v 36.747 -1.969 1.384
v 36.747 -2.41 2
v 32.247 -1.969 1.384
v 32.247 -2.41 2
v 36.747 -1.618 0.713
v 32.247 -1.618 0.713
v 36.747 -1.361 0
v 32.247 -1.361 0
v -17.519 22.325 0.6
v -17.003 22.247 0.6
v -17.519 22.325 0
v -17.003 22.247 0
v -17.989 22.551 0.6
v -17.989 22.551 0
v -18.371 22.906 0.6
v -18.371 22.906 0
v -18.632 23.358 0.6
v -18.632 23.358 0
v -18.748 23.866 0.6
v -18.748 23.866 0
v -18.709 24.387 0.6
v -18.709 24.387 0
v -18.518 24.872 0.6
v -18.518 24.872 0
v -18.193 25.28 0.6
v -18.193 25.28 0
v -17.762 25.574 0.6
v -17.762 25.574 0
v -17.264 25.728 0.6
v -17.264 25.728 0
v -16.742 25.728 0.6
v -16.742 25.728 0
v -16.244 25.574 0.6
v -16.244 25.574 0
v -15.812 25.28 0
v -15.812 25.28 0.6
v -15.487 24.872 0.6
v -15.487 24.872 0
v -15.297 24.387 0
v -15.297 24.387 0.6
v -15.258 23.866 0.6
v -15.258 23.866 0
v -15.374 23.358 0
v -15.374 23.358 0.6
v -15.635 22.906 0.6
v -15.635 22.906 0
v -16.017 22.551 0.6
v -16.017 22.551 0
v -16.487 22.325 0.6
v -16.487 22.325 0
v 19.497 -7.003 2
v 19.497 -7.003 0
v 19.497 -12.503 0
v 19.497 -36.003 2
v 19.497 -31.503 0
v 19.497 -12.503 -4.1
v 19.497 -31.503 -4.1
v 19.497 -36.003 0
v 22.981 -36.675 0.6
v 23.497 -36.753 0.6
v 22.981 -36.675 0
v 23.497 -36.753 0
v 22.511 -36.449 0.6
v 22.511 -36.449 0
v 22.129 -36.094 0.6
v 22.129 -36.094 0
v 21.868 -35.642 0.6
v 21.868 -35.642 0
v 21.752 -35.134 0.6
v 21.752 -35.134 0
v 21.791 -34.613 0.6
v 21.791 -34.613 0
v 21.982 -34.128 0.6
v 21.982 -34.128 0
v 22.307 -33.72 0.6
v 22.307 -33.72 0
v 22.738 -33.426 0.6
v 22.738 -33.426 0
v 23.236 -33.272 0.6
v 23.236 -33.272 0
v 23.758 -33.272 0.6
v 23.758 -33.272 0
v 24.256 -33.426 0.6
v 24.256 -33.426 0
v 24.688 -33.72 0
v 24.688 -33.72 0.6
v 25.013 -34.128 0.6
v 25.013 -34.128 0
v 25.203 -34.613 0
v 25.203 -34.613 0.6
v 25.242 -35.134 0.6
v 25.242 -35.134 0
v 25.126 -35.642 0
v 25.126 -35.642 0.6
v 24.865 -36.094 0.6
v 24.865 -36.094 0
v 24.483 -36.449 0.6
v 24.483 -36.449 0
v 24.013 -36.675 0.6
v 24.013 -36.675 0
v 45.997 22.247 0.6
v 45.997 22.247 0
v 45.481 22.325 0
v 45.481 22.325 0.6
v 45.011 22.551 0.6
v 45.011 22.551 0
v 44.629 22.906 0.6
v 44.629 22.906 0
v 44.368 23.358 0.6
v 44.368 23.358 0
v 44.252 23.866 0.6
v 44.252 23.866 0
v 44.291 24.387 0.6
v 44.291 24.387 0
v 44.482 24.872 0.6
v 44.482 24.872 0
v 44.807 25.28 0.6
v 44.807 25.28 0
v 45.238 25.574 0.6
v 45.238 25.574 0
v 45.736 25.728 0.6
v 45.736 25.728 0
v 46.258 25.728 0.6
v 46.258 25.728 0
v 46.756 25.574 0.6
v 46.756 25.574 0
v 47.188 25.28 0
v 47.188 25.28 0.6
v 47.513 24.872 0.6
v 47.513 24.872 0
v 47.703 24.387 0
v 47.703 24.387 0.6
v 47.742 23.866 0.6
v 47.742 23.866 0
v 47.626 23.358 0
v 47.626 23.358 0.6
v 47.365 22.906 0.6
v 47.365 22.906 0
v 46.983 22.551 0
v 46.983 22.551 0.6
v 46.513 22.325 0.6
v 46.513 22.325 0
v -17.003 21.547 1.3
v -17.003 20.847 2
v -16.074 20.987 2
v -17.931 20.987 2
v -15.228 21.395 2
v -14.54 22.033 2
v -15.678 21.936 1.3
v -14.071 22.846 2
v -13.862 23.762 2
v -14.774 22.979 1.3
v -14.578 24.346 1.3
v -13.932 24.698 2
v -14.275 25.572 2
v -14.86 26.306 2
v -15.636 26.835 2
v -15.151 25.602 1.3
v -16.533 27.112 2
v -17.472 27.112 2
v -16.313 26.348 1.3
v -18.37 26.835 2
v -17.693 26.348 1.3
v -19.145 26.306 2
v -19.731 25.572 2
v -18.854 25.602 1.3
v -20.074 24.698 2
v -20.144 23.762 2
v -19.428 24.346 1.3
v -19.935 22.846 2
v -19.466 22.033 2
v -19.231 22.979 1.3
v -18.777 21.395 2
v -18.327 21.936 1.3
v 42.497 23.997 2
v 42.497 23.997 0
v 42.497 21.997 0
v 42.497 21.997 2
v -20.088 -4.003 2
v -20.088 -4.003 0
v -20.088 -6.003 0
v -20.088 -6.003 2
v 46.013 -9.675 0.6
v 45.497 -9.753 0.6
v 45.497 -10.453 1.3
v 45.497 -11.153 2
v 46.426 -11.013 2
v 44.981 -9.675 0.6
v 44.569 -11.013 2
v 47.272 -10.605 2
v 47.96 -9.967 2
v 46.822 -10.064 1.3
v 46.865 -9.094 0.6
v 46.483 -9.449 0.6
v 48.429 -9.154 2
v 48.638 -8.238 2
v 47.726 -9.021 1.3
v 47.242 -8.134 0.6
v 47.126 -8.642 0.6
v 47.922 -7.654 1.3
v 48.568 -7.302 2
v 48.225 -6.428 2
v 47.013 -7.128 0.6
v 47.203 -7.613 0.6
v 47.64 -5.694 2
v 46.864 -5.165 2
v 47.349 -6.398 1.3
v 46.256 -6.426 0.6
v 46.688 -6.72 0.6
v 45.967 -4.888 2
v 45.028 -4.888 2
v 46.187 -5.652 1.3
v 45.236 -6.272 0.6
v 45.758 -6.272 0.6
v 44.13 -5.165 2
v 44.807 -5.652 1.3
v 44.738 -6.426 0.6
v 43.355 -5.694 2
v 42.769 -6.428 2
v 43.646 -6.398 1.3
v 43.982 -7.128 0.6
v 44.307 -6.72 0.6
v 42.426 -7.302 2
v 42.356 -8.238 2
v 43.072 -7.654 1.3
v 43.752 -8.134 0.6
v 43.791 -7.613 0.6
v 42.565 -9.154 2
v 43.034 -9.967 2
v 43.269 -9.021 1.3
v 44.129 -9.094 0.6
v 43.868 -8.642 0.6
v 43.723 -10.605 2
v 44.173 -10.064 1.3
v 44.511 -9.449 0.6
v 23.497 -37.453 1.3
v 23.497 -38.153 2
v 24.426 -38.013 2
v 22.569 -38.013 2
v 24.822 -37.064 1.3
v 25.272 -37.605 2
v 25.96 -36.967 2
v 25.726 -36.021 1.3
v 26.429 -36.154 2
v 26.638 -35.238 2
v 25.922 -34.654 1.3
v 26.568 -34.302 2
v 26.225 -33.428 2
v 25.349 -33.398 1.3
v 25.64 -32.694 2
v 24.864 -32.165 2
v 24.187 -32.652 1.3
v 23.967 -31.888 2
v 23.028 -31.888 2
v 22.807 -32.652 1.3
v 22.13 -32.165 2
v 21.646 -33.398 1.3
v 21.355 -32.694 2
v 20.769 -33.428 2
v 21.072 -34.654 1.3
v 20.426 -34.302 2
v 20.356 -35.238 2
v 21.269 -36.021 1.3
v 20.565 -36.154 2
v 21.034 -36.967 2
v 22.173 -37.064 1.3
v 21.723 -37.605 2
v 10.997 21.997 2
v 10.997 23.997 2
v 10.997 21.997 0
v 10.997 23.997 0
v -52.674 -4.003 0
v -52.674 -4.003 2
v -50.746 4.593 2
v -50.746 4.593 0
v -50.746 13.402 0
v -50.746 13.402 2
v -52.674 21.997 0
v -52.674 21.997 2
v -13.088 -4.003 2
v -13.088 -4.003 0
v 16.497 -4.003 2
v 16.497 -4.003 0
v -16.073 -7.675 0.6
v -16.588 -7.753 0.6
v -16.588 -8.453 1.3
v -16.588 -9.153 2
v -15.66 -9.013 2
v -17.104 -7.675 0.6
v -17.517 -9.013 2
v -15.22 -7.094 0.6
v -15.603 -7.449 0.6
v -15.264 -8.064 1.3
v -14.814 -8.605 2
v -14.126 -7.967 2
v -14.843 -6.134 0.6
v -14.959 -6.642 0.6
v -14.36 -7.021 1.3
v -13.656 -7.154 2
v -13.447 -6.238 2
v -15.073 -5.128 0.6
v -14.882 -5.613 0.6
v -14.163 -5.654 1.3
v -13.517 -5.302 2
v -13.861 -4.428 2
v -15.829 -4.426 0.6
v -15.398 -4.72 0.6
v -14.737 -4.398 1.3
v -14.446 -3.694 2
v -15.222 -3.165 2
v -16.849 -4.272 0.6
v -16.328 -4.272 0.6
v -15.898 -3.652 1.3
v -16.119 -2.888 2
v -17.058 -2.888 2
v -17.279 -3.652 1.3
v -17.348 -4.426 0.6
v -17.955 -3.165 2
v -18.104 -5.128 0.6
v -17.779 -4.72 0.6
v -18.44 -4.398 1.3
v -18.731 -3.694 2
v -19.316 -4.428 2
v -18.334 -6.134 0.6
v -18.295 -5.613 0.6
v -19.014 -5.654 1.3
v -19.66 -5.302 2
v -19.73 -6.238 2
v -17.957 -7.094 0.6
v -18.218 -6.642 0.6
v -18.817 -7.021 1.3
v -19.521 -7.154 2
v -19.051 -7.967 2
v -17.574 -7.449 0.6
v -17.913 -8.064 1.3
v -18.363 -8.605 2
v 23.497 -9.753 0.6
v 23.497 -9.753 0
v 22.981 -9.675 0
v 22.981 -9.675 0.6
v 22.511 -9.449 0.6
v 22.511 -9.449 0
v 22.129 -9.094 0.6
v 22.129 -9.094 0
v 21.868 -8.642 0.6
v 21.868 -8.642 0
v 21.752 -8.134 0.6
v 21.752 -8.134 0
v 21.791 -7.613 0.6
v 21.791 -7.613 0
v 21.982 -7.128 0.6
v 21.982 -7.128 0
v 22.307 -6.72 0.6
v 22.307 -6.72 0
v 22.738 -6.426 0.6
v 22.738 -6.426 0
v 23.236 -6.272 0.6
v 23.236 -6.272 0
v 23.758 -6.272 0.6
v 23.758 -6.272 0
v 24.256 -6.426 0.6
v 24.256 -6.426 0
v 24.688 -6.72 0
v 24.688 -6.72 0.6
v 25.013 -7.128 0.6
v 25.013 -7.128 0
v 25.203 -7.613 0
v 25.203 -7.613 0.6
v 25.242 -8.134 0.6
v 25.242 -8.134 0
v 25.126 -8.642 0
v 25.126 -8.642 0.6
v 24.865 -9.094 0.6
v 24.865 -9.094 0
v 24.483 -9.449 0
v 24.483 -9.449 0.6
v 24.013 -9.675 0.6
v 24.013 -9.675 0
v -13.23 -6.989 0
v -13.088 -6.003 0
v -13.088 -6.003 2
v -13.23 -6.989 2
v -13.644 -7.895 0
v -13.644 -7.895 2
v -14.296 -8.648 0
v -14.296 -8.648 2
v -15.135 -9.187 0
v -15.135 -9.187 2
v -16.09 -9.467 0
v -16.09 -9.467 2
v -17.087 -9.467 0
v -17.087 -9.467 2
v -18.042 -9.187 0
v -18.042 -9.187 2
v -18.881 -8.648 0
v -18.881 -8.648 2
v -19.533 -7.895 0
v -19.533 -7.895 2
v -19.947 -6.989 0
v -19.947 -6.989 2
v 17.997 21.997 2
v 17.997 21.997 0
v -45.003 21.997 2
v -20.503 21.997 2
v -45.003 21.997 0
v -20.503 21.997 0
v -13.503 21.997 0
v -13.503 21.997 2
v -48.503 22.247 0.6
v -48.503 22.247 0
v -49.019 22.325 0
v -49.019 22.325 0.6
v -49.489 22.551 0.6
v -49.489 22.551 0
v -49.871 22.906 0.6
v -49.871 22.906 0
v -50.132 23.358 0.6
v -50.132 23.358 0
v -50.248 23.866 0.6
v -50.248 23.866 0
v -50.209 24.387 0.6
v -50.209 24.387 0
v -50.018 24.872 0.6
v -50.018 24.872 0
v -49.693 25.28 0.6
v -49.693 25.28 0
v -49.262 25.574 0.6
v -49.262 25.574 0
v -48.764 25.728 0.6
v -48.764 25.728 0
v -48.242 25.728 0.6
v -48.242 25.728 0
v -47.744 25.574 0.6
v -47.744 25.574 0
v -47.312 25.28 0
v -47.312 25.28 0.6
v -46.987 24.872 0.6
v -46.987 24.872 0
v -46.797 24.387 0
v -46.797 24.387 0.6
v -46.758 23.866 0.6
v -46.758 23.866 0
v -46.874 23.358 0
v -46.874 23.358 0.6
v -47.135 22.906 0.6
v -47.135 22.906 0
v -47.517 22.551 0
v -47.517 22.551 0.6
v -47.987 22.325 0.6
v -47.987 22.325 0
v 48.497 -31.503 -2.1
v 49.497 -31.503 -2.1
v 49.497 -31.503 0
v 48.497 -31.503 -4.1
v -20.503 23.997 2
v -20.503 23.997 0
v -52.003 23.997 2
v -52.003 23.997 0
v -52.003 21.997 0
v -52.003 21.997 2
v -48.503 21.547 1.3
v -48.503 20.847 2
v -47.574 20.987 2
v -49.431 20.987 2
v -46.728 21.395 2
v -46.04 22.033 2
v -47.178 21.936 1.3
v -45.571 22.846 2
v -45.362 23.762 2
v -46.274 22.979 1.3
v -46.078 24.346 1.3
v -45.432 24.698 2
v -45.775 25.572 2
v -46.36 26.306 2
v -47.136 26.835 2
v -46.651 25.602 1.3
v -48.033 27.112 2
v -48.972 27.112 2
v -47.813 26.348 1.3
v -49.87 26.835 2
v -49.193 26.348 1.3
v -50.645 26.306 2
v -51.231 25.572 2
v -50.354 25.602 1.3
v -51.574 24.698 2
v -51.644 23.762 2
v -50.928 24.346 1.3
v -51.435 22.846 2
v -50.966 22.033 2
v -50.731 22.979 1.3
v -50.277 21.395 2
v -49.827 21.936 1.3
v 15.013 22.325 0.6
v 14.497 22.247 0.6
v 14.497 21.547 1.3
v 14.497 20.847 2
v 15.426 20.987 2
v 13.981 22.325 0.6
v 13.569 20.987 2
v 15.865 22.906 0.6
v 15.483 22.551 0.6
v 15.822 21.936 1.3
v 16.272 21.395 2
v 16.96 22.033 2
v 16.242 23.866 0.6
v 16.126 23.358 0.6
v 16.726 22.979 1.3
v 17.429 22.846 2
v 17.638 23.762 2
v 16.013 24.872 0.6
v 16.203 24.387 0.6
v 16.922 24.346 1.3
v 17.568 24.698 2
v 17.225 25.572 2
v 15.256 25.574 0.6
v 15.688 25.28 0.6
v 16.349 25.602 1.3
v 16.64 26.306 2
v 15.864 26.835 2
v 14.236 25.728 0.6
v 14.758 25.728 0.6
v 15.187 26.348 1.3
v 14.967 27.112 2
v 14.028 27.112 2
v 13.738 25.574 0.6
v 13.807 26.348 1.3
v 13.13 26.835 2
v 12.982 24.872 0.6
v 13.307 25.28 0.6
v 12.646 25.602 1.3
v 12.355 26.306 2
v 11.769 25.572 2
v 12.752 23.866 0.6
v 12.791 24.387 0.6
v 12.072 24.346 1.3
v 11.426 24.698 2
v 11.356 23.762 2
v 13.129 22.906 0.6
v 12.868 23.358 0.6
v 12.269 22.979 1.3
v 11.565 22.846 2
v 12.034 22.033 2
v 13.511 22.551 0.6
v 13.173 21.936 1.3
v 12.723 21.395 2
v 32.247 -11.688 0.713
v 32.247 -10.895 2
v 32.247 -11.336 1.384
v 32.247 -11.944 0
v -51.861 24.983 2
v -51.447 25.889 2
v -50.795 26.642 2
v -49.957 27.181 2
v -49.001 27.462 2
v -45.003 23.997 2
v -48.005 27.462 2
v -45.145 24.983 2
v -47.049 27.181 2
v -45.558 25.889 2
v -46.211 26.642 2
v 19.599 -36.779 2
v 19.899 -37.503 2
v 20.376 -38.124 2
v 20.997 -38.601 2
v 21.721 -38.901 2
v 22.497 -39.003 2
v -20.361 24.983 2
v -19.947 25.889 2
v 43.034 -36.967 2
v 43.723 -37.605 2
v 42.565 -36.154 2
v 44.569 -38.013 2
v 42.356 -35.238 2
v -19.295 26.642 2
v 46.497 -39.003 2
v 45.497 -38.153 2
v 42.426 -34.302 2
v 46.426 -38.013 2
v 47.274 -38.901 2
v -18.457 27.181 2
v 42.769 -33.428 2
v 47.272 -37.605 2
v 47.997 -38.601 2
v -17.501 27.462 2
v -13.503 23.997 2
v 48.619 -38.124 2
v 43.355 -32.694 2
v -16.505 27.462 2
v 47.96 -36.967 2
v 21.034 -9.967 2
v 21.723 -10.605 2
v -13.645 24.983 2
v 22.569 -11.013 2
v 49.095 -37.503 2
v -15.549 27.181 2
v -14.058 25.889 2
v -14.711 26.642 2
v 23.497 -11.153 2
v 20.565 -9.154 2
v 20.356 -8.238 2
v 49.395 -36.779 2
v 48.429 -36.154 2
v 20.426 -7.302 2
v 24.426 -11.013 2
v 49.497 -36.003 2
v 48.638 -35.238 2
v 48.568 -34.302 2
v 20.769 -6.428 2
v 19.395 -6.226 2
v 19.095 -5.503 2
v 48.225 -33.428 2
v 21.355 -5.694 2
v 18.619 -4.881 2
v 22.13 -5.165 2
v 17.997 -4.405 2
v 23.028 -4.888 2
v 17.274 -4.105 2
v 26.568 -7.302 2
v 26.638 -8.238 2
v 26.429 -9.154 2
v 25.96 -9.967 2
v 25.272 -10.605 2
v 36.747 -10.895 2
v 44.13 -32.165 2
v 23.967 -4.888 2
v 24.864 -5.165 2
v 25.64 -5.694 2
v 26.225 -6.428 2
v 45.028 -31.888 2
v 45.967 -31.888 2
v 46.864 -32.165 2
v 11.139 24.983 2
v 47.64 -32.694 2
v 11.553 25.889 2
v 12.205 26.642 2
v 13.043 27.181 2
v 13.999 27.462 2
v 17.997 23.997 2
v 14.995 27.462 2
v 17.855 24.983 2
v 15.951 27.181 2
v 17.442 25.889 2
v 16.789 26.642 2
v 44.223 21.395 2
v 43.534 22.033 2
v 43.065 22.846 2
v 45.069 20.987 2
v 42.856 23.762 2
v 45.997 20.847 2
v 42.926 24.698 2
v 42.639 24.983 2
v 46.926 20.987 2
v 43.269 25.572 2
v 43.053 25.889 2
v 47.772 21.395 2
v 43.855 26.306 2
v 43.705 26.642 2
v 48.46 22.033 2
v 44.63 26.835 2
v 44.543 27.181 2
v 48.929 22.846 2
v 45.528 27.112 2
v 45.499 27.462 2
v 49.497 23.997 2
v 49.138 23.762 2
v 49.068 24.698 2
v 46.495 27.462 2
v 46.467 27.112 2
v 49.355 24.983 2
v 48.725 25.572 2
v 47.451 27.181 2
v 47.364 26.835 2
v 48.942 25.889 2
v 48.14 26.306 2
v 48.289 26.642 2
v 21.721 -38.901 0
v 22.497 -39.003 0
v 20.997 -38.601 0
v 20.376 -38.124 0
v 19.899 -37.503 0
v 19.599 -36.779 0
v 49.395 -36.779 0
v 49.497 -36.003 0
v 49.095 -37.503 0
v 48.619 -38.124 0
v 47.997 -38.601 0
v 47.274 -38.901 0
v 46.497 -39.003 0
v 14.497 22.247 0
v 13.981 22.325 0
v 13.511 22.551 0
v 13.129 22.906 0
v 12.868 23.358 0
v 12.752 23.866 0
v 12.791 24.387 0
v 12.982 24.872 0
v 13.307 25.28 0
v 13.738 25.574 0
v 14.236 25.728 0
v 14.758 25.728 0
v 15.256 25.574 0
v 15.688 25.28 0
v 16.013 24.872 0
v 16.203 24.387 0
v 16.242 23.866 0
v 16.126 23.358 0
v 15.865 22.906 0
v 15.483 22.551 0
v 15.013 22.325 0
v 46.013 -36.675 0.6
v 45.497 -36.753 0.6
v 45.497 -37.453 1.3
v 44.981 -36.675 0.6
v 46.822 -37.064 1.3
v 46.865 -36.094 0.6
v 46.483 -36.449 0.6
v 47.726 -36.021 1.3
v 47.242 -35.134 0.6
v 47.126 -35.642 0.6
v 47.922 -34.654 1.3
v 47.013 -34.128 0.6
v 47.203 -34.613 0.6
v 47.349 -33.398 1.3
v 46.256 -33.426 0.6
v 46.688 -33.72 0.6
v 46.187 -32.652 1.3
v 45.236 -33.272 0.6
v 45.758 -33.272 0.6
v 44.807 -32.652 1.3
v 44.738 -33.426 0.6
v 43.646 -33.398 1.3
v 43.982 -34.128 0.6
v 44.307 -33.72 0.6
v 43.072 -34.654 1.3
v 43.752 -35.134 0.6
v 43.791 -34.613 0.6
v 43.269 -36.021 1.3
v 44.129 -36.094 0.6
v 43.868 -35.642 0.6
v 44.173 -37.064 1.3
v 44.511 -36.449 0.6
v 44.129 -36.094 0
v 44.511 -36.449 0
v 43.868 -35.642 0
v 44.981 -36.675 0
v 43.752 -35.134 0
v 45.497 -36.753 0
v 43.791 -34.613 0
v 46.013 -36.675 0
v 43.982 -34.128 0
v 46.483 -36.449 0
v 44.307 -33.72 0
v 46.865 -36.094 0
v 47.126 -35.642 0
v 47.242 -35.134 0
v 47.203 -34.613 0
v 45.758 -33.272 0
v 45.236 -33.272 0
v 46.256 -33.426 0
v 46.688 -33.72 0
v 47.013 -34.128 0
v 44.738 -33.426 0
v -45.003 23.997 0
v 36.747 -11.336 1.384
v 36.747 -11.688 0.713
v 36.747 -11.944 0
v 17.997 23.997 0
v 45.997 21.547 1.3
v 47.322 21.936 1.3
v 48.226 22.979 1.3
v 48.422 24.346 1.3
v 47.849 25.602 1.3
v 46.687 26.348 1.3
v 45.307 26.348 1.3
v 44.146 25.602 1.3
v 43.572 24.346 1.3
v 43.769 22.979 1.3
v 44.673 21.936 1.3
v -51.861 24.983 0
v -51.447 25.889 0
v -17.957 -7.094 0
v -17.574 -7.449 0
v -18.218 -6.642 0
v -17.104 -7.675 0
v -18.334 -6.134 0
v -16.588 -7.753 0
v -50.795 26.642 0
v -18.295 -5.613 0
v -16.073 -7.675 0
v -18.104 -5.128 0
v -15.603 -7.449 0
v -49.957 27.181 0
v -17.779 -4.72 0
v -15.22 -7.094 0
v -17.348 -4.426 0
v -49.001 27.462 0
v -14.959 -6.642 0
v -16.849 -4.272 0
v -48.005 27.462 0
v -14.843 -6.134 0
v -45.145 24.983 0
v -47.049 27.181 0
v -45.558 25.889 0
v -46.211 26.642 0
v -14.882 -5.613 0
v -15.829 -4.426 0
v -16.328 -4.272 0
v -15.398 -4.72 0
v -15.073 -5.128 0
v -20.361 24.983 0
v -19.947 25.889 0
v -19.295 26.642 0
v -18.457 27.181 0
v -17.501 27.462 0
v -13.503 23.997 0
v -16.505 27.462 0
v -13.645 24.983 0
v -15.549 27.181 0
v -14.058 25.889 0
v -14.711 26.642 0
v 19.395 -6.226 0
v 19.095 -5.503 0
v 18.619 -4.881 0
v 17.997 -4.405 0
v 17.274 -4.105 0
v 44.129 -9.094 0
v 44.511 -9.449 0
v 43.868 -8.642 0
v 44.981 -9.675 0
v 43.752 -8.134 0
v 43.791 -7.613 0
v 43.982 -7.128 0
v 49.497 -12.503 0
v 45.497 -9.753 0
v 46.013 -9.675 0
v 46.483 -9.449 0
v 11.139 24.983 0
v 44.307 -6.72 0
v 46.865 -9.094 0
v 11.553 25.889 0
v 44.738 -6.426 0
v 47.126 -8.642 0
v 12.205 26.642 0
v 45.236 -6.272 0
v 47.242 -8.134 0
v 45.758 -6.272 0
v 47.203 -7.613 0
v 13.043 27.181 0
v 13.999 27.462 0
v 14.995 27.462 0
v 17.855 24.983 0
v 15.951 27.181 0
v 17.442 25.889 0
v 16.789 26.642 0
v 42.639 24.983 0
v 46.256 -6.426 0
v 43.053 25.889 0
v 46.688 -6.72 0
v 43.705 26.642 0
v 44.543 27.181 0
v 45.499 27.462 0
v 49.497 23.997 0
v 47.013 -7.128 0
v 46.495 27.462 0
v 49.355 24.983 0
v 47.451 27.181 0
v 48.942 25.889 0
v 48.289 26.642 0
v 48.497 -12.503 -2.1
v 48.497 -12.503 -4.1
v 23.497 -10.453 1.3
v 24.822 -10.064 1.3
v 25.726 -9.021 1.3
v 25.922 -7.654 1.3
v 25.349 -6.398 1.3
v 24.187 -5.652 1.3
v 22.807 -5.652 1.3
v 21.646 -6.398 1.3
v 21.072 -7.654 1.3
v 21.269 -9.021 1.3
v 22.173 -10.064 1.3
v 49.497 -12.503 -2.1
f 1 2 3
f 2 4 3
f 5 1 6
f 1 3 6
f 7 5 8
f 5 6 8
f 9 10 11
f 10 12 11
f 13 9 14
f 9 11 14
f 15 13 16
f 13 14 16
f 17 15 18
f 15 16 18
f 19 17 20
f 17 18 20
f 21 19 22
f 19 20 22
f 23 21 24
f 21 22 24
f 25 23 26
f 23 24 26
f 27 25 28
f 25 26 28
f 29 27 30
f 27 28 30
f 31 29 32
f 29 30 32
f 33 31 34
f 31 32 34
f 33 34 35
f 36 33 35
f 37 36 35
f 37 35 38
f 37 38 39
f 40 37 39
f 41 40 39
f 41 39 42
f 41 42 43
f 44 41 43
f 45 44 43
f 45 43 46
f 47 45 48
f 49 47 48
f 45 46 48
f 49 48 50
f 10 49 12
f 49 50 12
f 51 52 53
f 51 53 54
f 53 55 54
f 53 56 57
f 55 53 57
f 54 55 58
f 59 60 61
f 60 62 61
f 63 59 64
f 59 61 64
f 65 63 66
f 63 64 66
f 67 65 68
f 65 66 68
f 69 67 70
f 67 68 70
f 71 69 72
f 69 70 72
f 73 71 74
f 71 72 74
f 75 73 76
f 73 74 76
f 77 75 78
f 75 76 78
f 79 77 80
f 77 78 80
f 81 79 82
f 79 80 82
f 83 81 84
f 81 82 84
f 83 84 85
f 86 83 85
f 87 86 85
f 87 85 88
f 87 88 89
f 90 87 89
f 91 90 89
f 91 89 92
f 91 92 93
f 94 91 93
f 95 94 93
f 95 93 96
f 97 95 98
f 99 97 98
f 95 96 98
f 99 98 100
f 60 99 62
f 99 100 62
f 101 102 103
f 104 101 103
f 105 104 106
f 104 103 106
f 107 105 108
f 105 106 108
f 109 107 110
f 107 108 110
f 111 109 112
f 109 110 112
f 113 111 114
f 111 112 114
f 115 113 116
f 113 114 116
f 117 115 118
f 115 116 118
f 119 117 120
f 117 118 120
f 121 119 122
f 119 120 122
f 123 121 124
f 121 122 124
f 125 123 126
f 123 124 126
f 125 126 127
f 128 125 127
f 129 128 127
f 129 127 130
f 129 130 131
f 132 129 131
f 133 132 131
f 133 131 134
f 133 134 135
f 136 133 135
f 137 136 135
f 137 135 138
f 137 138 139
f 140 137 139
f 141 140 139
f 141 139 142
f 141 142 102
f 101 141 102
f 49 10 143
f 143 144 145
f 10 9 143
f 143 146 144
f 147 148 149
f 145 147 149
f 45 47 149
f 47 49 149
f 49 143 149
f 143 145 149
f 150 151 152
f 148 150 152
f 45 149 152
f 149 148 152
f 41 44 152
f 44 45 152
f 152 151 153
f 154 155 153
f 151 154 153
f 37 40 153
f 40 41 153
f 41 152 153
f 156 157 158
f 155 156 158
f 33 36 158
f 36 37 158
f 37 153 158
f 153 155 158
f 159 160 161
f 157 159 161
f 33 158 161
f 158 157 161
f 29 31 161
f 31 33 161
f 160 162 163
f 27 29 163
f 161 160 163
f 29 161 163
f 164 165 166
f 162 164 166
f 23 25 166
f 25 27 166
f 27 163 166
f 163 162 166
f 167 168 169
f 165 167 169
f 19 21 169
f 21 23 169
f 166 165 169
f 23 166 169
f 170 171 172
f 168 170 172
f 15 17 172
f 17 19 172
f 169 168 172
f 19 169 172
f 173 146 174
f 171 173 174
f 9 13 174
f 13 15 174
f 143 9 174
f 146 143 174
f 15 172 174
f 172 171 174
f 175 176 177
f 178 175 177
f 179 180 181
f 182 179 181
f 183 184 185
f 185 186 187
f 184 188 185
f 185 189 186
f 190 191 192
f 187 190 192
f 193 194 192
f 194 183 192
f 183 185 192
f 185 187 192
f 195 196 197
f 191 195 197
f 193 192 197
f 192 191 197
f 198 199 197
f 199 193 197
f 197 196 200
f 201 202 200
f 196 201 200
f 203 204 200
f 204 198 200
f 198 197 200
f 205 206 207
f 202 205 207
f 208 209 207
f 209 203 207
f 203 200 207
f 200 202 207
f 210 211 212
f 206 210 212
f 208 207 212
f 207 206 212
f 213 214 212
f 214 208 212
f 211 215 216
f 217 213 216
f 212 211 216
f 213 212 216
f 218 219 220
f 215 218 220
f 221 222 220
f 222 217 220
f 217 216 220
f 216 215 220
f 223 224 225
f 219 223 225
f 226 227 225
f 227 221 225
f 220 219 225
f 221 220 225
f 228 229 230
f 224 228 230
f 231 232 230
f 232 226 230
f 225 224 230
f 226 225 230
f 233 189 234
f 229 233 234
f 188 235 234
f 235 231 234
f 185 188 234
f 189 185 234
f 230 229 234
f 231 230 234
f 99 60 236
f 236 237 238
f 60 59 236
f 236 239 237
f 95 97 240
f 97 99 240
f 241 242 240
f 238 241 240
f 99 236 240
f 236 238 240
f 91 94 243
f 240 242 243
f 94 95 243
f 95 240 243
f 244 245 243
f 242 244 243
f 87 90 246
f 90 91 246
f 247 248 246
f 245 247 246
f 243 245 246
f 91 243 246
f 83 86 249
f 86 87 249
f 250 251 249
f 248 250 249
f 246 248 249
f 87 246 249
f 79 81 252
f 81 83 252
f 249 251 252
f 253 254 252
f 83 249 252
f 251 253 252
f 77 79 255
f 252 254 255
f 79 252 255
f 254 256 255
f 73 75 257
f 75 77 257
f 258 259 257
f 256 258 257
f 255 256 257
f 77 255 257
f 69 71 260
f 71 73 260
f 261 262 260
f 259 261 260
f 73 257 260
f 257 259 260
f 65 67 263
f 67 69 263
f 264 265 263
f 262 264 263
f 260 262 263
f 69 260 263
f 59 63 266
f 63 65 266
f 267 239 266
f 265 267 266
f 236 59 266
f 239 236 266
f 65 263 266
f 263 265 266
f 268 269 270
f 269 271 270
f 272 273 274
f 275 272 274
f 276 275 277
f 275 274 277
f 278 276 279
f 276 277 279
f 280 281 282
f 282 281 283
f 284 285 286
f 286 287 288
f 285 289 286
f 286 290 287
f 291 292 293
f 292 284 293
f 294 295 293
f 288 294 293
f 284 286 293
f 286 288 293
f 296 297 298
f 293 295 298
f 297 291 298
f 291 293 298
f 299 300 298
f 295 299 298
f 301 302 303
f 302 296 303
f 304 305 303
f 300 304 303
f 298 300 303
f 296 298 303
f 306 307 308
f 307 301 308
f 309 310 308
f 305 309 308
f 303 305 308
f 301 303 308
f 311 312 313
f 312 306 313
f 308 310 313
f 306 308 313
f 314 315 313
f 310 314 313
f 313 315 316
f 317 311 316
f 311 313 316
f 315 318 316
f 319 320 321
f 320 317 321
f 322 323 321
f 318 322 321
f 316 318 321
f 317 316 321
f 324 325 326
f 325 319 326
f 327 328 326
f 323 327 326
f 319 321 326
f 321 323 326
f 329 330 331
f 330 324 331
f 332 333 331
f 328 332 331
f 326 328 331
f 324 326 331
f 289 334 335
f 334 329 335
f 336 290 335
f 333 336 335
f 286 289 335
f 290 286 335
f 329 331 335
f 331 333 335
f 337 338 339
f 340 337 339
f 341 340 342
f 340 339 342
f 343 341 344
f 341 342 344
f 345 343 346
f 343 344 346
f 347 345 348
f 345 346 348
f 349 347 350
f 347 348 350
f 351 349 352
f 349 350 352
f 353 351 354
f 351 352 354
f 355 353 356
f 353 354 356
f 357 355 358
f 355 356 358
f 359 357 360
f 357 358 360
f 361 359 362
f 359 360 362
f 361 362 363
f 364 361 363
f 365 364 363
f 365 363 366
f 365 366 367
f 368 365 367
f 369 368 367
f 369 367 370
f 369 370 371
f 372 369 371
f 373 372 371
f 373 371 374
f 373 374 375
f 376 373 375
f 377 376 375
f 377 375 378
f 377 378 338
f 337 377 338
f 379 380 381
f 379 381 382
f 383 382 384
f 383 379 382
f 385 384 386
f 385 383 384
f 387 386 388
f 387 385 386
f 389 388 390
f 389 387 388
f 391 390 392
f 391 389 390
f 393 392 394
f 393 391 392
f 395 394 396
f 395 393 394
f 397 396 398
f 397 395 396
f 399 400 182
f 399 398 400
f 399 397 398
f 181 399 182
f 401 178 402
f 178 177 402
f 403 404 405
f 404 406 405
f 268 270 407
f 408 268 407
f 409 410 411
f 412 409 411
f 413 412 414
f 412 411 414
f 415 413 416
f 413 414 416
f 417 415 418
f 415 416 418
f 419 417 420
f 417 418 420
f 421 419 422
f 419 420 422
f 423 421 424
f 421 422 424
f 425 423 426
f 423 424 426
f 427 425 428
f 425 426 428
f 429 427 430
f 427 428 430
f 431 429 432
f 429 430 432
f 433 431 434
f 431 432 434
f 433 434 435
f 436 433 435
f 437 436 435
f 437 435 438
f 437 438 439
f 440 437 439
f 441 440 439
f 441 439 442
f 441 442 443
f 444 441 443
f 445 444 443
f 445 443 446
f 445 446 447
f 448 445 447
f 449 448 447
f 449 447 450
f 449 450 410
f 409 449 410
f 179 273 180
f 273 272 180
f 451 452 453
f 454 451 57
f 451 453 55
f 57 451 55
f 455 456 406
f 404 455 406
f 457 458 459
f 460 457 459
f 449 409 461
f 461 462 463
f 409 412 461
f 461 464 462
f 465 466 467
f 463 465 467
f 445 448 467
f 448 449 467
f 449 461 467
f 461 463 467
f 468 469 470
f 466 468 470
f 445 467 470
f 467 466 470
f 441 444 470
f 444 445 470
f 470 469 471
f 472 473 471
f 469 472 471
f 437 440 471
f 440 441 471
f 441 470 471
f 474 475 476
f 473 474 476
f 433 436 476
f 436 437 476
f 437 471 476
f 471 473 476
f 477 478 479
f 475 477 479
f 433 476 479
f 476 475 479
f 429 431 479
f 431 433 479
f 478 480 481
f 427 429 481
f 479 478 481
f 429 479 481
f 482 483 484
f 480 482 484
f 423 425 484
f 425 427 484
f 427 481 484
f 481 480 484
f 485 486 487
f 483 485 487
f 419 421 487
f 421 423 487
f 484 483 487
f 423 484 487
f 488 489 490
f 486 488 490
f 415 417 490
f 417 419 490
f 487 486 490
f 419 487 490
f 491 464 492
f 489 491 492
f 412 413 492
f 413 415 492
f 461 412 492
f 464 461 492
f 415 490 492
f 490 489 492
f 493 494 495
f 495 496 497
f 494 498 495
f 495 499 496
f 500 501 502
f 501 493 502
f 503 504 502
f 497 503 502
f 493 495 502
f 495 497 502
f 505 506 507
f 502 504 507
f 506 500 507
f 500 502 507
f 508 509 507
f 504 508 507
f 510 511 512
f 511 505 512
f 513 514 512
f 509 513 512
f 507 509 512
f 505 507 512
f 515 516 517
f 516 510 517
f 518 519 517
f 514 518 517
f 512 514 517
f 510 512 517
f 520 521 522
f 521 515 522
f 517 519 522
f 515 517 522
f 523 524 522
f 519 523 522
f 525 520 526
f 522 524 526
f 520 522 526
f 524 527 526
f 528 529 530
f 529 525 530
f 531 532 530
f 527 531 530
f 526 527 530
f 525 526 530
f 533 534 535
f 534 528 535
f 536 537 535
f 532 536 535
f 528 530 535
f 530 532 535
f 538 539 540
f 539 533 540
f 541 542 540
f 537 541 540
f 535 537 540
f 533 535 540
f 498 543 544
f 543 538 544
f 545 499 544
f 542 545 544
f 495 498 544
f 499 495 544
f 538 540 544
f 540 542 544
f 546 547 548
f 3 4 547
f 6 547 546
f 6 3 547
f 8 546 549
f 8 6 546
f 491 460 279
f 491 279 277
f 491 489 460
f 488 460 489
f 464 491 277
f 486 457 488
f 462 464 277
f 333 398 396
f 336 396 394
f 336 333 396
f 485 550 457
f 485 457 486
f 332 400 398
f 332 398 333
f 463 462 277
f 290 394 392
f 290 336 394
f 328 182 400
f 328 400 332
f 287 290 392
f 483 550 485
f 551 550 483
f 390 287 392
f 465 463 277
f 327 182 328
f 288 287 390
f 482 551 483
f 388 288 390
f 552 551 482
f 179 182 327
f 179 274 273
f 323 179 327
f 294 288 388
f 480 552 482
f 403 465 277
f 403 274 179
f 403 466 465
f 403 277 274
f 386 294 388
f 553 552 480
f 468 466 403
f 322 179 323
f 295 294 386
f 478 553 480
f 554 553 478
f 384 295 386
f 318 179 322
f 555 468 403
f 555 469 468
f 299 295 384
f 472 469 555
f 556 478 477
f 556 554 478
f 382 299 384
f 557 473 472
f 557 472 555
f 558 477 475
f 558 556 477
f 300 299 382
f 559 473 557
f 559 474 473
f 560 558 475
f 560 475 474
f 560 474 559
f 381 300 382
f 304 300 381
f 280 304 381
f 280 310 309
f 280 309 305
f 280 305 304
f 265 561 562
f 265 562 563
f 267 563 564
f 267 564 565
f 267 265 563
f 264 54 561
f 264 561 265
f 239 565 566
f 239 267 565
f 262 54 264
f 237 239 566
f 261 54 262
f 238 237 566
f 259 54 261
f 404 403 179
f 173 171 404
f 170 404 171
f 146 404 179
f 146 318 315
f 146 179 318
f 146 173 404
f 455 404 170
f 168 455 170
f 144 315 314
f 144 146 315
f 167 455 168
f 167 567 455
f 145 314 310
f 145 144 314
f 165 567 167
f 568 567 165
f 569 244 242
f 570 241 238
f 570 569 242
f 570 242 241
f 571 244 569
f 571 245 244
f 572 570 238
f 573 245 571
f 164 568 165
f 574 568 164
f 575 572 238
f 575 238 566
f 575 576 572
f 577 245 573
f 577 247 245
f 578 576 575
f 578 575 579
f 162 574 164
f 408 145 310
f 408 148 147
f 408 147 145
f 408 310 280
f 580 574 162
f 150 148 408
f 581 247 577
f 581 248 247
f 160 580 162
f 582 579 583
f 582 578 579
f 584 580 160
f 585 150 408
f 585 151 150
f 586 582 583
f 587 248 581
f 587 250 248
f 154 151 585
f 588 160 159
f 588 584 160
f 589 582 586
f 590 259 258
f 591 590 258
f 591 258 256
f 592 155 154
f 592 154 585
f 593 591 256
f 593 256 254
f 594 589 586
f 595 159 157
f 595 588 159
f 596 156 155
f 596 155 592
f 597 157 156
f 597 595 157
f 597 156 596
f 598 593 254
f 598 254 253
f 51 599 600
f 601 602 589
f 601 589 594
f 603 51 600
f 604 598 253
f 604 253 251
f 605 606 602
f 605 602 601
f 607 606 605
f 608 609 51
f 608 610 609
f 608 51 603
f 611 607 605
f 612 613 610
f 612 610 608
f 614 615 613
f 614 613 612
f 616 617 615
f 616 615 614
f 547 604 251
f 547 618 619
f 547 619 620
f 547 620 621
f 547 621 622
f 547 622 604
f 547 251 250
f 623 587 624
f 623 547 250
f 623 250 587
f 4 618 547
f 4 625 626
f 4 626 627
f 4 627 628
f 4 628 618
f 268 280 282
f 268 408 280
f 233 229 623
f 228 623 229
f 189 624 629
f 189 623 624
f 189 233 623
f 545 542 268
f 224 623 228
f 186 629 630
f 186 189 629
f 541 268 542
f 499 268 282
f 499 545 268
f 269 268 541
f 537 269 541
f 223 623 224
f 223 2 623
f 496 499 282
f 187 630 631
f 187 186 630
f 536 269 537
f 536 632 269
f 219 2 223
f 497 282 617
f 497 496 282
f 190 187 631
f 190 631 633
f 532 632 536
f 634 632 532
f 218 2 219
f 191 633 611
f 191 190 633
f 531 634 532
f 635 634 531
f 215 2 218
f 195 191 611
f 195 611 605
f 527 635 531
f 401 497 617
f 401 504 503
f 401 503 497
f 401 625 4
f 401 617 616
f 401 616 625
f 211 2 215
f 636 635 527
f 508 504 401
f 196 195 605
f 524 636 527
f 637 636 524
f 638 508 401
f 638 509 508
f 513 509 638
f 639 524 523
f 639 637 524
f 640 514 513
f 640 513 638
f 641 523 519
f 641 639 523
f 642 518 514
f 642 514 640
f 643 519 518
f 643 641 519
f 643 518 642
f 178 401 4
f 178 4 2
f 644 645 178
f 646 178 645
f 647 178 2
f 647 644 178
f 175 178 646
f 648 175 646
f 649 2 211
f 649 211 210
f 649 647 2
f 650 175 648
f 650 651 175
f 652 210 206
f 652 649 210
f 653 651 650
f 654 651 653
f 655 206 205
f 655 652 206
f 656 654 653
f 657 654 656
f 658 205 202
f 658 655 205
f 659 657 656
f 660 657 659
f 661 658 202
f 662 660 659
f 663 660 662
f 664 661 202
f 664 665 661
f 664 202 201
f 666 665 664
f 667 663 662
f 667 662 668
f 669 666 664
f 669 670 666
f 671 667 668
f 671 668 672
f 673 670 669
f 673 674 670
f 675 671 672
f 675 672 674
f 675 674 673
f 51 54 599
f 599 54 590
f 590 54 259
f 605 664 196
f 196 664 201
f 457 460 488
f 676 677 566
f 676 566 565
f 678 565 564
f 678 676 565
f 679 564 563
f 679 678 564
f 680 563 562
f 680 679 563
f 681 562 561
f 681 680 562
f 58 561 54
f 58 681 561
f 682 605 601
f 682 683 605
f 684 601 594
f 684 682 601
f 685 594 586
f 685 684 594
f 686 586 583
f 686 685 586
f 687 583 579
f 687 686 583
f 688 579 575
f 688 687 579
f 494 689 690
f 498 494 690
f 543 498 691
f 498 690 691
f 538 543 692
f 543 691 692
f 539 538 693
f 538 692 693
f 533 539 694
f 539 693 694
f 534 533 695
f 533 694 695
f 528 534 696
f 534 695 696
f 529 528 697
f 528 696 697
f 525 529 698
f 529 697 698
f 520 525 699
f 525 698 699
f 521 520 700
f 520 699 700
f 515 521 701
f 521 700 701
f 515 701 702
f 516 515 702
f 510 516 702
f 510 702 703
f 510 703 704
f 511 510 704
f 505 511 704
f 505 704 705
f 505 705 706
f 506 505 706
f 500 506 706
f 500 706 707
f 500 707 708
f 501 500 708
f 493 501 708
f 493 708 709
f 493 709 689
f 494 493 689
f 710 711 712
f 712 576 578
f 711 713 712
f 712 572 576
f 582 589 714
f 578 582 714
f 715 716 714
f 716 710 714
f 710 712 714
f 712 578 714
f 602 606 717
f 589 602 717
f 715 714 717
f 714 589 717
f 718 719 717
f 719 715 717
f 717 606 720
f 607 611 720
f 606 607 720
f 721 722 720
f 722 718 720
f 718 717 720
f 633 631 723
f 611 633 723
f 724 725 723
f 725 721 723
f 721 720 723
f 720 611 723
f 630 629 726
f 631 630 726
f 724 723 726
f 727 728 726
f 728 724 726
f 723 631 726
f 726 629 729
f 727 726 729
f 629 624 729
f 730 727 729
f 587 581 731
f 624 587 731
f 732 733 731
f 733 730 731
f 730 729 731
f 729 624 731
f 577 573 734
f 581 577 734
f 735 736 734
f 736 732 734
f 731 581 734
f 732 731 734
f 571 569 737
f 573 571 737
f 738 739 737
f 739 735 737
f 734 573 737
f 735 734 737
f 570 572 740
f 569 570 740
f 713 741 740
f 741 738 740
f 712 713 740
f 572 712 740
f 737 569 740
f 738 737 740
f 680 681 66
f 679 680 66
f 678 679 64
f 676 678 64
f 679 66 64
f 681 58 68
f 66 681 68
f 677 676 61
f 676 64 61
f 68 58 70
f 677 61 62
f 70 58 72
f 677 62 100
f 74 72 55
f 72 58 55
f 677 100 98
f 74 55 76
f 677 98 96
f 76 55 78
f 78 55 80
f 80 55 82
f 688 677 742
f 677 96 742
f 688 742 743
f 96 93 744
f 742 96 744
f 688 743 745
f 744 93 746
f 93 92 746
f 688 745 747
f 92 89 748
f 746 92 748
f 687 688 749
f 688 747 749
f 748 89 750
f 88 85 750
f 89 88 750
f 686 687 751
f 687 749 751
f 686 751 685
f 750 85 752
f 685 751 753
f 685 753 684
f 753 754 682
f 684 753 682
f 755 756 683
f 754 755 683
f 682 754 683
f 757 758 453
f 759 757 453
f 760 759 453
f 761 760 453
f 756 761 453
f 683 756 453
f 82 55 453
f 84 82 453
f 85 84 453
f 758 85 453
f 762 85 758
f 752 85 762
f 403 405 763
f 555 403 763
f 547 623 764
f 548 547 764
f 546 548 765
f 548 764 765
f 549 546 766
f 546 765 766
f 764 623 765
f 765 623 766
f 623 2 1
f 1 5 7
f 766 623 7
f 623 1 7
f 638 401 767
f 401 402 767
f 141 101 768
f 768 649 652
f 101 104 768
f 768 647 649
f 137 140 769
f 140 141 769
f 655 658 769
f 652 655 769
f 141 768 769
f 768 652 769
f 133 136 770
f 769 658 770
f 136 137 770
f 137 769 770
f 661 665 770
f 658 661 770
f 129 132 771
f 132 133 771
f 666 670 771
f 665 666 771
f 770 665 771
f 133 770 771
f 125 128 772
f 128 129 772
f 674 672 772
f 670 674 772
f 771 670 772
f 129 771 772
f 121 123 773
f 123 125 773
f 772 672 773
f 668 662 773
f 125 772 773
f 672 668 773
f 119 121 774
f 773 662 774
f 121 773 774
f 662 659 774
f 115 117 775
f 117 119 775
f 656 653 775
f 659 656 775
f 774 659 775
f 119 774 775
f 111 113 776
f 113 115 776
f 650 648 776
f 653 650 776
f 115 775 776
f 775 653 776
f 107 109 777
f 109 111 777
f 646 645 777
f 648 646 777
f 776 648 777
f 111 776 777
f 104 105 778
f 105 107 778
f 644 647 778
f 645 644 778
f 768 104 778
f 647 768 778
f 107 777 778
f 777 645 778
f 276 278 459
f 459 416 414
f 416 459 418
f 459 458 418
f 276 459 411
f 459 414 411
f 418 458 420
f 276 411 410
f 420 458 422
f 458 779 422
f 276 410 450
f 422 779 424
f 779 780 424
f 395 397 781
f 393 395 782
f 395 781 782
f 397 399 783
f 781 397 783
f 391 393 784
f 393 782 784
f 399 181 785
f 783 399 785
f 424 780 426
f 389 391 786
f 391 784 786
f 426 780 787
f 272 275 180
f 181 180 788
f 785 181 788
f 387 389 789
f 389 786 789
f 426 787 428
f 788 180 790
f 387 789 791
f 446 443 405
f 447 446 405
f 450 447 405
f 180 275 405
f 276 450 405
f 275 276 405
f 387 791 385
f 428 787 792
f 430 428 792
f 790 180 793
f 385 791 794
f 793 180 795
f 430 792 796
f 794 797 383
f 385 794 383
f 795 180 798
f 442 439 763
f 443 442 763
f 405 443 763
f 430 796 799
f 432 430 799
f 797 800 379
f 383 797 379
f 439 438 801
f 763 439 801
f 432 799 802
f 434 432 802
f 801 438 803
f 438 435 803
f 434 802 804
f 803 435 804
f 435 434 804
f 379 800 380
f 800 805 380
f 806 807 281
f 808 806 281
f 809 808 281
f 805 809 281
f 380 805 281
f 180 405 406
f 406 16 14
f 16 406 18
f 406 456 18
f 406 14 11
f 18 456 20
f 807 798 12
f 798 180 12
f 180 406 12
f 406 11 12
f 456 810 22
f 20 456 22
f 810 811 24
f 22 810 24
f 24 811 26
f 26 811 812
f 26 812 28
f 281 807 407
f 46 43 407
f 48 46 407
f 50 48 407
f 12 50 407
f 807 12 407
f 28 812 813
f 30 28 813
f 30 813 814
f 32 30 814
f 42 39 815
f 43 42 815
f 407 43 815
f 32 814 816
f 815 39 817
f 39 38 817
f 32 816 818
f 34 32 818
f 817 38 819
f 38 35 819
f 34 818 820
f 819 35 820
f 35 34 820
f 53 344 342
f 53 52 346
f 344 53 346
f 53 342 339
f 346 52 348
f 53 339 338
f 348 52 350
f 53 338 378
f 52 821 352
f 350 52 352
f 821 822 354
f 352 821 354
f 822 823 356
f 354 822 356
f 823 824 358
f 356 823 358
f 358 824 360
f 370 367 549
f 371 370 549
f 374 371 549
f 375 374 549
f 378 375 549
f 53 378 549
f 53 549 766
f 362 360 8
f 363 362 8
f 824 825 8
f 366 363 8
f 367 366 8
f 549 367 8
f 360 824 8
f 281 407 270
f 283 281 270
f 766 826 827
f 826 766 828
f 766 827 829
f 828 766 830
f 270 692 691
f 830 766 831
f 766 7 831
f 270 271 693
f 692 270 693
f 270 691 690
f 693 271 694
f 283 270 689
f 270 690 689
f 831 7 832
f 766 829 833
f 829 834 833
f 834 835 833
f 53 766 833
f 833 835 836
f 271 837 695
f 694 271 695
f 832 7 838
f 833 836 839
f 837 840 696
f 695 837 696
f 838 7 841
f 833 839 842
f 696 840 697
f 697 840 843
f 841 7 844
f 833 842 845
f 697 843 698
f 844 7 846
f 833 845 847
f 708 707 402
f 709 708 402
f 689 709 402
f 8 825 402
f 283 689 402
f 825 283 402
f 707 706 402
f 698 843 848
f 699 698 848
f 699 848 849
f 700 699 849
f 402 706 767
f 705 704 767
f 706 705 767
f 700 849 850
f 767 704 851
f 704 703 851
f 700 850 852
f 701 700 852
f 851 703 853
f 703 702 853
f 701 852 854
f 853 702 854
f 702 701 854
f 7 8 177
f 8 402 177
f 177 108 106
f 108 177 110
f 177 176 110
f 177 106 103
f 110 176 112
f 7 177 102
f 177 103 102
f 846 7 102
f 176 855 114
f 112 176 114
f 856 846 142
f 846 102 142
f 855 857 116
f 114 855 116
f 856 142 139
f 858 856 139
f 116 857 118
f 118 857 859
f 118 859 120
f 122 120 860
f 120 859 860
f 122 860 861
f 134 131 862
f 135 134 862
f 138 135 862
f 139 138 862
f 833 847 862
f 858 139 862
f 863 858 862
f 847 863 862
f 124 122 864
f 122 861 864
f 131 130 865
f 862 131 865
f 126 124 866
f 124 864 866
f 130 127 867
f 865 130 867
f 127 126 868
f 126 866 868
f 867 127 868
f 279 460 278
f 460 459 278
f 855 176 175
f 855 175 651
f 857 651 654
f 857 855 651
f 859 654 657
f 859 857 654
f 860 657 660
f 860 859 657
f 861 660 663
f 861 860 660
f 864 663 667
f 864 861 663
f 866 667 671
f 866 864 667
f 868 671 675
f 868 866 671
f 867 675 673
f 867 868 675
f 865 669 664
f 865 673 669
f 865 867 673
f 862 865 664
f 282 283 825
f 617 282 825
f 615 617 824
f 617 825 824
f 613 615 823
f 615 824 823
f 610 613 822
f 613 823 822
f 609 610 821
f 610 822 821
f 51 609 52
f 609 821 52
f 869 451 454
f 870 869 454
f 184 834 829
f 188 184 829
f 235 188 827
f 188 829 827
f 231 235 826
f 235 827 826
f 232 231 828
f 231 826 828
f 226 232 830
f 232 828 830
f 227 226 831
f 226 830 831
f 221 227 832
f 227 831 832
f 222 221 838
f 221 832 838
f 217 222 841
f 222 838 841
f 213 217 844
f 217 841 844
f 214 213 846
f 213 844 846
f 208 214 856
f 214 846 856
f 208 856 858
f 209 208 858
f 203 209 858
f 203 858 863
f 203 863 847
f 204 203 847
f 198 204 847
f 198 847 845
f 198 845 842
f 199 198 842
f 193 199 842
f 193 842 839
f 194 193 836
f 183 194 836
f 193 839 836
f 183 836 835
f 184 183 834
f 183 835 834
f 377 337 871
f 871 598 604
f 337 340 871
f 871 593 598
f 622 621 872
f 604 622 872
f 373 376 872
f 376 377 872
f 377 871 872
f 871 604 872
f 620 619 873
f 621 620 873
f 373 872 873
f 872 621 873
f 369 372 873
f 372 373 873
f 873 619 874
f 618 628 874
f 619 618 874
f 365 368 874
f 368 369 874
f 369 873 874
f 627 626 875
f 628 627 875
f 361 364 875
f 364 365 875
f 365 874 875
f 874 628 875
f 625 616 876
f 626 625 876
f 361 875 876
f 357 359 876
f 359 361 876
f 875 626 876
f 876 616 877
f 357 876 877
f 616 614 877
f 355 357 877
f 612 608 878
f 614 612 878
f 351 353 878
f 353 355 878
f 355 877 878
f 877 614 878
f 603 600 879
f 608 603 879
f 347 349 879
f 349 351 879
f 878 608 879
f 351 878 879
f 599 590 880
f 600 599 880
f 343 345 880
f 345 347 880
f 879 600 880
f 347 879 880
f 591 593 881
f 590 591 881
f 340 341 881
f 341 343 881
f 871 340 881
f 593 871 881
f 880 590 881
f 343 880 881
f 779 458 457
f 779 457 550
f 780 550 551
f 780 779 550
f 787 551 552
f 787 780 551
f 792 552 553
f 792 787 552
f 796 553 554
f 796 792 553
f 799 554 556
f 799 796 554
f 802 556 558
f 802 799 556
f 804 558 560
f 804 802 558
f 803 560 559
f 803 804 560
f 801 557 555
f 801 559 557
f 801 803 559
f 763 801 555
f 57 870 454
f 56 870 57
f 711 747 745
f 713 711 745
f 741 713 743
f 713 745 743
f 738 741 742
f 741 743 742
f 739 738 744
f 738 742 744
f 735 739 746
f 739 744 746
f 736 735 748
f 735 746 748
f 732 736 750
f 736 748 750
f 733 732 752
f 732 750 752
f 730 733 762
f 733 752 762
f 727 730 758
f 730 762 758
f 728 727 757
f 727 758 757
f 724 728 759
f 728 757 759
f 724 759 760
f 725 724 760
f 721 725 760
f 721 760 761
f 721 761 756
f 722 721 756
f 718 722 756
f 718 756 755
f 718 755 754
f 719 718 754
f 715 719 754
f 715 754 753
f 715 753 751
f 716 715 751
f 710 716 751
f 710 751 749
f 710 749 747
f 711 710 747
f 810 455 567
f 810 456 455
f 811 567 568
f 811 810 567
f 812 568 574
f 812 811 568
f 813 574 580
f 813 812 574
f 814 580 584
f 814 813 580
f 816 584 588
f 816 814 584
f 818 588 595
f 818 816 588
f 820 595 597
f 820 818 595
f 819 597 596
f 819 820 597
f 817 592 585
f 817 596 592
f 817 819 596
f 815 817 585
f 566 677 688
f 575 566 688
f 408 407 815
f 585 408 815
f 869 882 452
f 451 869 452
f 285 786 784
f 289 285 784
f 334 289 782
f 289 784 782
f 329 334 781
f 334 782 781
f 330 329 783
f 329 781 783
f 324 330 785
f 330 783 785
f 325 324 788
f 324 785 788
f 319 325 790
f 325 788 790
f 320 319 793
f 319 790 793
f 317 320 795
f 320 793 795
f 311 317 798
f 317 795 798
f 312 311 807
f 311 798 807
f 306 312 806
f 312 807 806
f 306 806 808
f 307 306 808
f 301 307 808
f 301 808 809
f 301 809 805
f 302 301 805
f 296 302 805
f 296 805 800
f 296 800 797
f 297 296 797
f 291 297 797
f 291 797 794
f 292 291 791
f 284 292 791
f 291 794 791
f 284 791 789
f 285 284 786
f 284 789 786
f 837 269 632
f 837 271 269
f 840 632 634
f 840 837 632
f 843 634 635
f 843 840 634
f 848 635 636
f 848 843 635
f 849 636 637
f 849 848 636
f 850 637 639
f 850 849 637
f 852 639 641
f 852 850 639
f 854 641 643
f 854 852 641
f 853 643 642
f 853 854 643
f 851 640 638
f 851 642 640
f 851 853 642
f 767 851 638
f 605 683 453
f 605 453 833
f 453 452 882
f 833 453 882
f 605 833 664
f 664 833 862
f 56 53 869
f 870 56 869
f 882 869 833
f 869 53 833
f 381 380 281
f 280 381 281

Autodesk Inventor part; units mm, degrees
ref_plane "Work Plane1" through (0, 0, 0) normal (0, 0, 1) x (1, 0, 0)
ref_plane "Work Plane2" through (0, 0, 0) normal (0, 0, 1) x (1, 0, 0)
ref_plane "Work Plane3" through (0, 0, 0) normal (0, 0, 1) x (1, 0, 0)
ref_plane "Work Plane4" through (0, 0, 0) normal (0, 0, 1) x (1, 0, 0)
sketch "Sketch4" plane through (0, 0, 0) normal (0, 0, 1) x (1, 0, 0)
  line L0 (49.4972, -32.0028) -> (22.4972, -32.0028) projected
  line L1 (22.4972, -32.0028) -> (22.4972, -12.0028) projected
  line L2 (22.4972, -12.0028) -> (49.4972, -12.0028) projected
  line L3 (49.4972, -12.0028) -> (49.4972, -1.3028) projected
  line L4 (49.4972, -1.3028) -> (-34.5028, -1.3028) projected
  line L5 (-34.5028, -1.3028) -> (-34.5028, 19.2972) projected
  line L6 (-34.5028, 19.2972) -> (49.4972, 19.2972) projected
  line L7 (49.4972, 19.2972) -> (49.4972, 23.9972) projected
  arc A0 (49.4972, 23.9972) -> (42.4972, 23.9972) centre (45.9972, 23.9972) ccw projected
  line L8 (42.4972, 23.9972) -> (42.4972, 21.9972) projected
  line L9 (42.4972, 21.9972) -> (17.9972, 21.9972) projected
  line L10 (17.9972, 21.9972) -> (17.9972, 23.9972) projected
  arc A1 (17.9972, 23.9972) -> (10.9972, 23.9972) centre (14.4972, 23.9972) ccw projected
  line L11 (10.9972, 23.9972) -> (10.9972, 21.9972) projected
  line L12 (10.9972, 21.9972) -> (-13.5028, 21.9972) projected
  line L13 (-13.5028, 21.9972) -> (-13.5028, 23.9972) projected
  arc A2 (-13.5028, 23.9972) -> (-20.5028, 23.9972) centre (-17.0028, 23.9972) ccw projected
  line L14 (-20.5028, 23.9972) -> (-20.5028, 21.9972) projected
  line L15 (-20.5028, 21.9972) -> (-45.0028, 21.9972) projected
  line L16 (-45.0028, 21.9972) -> (-45.0028, 23.9972) projected
  arc A3 (-45.0028, 23.9972) -> (-52.0028, 23.9972) centre (-48.5028, 23.9972) ccw projected
  line L17 (-52.0028, 23.9972) -> (-52.0028, 21.9972) projected
  line L18 (-52.0028, 21.9972) -> (-66.5028, 21.9972) projected
  line L19 (-66.5028, 21.9972) -> (-66.5028, -4.0028) projected
  line L20 (-66.5028, -4.0028) -> (-20.0885, -4.0028) projected
  line L21 (-20.0885, -4.0028) -> (-20.0885, -6.0028) projected
  arc A4 (-20.0885, -6.0028) -> (-13.0885, -6.0028) centre (-16.5885, -6.0028) ccw projected
  line L22 (-13.0885, -6.0028) -> (-13.0885, -4.0028) projected
  line L23 (-13.0885, -4.0028) -> (16.4972, -4.0028) projected
  line L24 (19.4972, -7.0028) -> (19.4972, -36.0028) projected
  line L25 (22.4972, -39.0028) -> (46.4972, -39.0028) projected
  line L26 (49.4972, -36.0028) -> (49.4972, -32.0028) projected
  circle A5 centre (-48.5028, 23.9972) radius 2 projected
  circle A6 centre (-17.0028, 23.9972) radius 2 projected
  circle A7 centre (14.4972, 23.9972) radius 2 projected
  circle A8 centre (45.9972, 23.9972) radius 2 projected
  circle A9 centre (-16.5885, -6.0028) radius 2 projected
  circle A10 centre (45.4972, -8.0028) radius 2 projected
  circle A11 centre (23.4972, -35.0028) radius 2 projected
  circle A12 centre (45.4972, -35.0028) radius 2 projected
  circle A13 centre (23.4972, -8.0028) radius 2 projected
  circle A14 centre (-90.5028, 8.9972) radius 40 projected
  line L27 (49.4972, 19.2972) -> (49.4972, -1.3028) projected
  line L28 (49.4972, 19.2972) -> (-34.5028, 19.2972) projected
  line L29 (-34.5028, 19.2972) -> (-34.5028, -1.3028) projected
  line L30 (49.4972, -1.3028) -> (-34.5028, -1.3028) projected
  circle A15 centre (-90.5028, 8.9972) radius 40 projected
  line L31 (49.4972, -32.0028) -> (22.4972, -32.0028) projected
  line L32 (49.4972, -12.0028) -> (49.4972, -32.0028) projected
  line L33 (22.4972, -12.0028) -> (49.4972, -12.0028) projected
  line L34 (22.4972, -32.0028) -> (22.4972, -12.0028) projected
  arc A16 (19.4972, -36.0028) -> (22.4972, -39.0028) centre (22.4972, -36.0028) ccw projected
  arc A17 (46.4972, -39.0028) -> (49.4972, -36.0028) centre (46.4972, -36.0028) ccw projected
  arc A18 (19.4972, -7.0028) -> (16.4972, -4.0028) centre (16.4972, -7.0028) ccw projected
  circle A19 centre (-62.0028, 0.4972) radius 2 projected
  circle A20 centre (-62.0028, 17.4972) radius 2 projected
  circle A21 centre (-56.0028, 8.9972) radius 2 projected
  point P0 (0, 0)
extrude "Extrusion1" add sketch "Sketch4" along normal blind 2 contours L26 A17 L25 A16 L24 A18 L23 L22 A4 L21 L20 A14 L18 L17 A3 L16 L15 L14 A2 L13 L12 L11 A1 L10 L9 L8 A0 L7 L6 L5 L4 L3 L2 L1 L0 | L0 L1 L2 L32 | L4 L5 L6 L27 | L20 L19 L18 A14 | A5 | A6 | A7 | A8 | A9 | A10 | A11 | A12 | A13 | A19 | A20 | A21 picked at (-65.6501, 6.3234)
sketch "Sketch5" plane through (0, 0, 2) normal (0, 0, 1) x (1, 0, 0)
  circle A0 centre (-90.5028, 8.9972) radius 40 projected
  point P0 (0, 0)
extrude "Extrusion2" cut sketch "Sketch5" against normal blind 3
sketch "Sketch6" plane through (0, 0, 0) normal (0, 0, -1) x (-1, 0, 0)
  line L0 (-49.4972, -36.0028) -> (-49.4972, 23.9972) projected
  line L1 (-19.4972, -7.0028) -> (-19.4972, -36.0028) projected
  line L2 (13.0885, -4.0028) -> (-16.4972, -4.0028) projected
  line L3 (-22.4972, -39.0028) -> (-46.4972, -39.0028) projected
  line L4 (-49.4972, -31.5028) -> (-19.4972, -31.5028)
  line L5 (-19.4972, -31.5028) -> (-19.4972, -12.5028)
  line L6 (-19.4972, -12.5028) -> (-49.4972, -12.5028)
  line L7 (-49.4972, -12.5028) -> (-49.4972, -31.5028)
  line L8 (-49.4972, -31.5028) -> (-19.4972, -12.5028) construction
  line L9 (-19.4972, -31.5028) -> (-49.4972, -12.5028) construction
  line L10 (-19.4972, -7.0028) -> (-19.4972, -36.0028) projected
  line L11 (-49.4972, -36.0028) -> (-49.4972, 23.9972) projected
  line L12 (-48.4972, -12.5028) -> (-48.4972, -31.5028)
  point P0 (0, 0)
  point P1 (-19.4972, -21.5028)
  point P2 (-34.4972, -22.0028)
  dimension "d42" = 19
  dimension "d45" = 7.5
  dimension "d47" = 1
extrude "Extrusion3" add sketch "Sketch6" along normal blind 4.1
sketch "Sketch7" plane through (0, 0, 2) normal (0, 0, 1) x (1, 0, 0)
  circle A0 centre (-48.5028, 23.9972) radius 2 projected
  circle A1 centre (-17.0028, 23.9972) radius 2 projected
  circle A2 centre (14.4972, 23.9972) radius 2 projected
  circle A3 centre (45.9972, 23.9972) radius 2 projected
  circle A4 centre (-16.5885, -6.0028) radius 2 projected
  circle A5 centre (23.4972, -35.0028) radius 2 projected
  circle A6 centre (23.4972, -8.0028) radius 2 projected
  circle A7 centre (45.4972, -8.0028) radius 2 projected
  circle A8 centre (45.4972, -35.0028) radius 2 projected
  point P0 (0, 0)
hole "Hole1" at (-16.5885, -6.0028, 2) at (-17.0028, 23.9972, 2) at (-48.5028, 23.9972, 2) at (14.4972, 23.9972, 2) at (45.9972, 23.9972, 2) at (23.4972, -8.0028, 2) at (45.4972, -8.0028, 2) at (45.4972, -35.0028, 2) at (23.4972, -35.0028, 2) direction (0, 0, -1) diameter 3.5 end through all countersink diameter 6.3 countersink angle 90
ref_plane "Work Plane5" through (22.4972, -32.0028, -15) normal (1, 0, 0) x (0, 1, 0)
sketch "Sketch13" plane through (0, 0, 0) normal (0, 0, -1) x (-1, 0, 0)
  line L0 (-42.4972, 21.9972) -> (-17.9972, 21.9972) projected
  line L1 (-49.4972, -36.0028) -> (-49.4972, 23.9972) projected
  line L2 (-19.4972, -7.0028) -> (-19.4972, -36.0028) projected
  point P0 (0, 0)
  point P1 (-34.4972, -6.6528)
  point P2 (-49.4972, -12.0028)
  point P3 (-19.4972, -12.0028)
  dimension "d28" = 28.65
  dimension "d29" = 30
  dimension "d30" = 15
ref_plane "Work Plane6" through (34.4972, -6.6528, 0) normal (1, 0, 0) x (0, 0, -1)
sketch "Sketch14" plane through (34.4972, -6.6528, 0) normal (1, 0, 0) x (0, 0, -1)
  circle A0 centre (1.5, 0) radius 5.5
  line L0 (-2, -29.35) -> (-2, 30.65) construction
  circle A1 centre (1.5, 0) radius 5 construction
  line L1 (-3.5, 0) -> (-3.5, 4.6838) construction
  point P0 (0, 6.6528)
  point P1 (0, 0)
  dimension "d34" = 10
  dimension "d31" = 1.5
  dimension "d32" = 11
extrude "Extrusion7" cut sketch "Sketch14" along normal mid plane 4.5
sketch "Sketch15" plane through (49.4972, -36.0028, 2) normal (1, 0, 0) x (0, 0, -1)
  line L0 (6.1, 4.5) -> (6.1, 23.5) projected
  line L1 (2, 4.5) -> (6.1, 4.5) projected
  line L2 (6.1, 23.5) -> (4.1, 23.5)
  line L3 (4.1, 23.5) -> (4.1, 4.5)
  line L4 (4.1, 4.5) -> (6.1, 4.5)
  line L5 (6.1, 4.5) -> (6.1, 23.5)
  point P0 (2, 36.0028)
  point P1 (6.1, 18.5)
  dimension "d48" = 2
extrude "Extrusion8" cut sketch "Sketch15" against normal blind 1
equation "\"d30\" = 0.5 * d29"
properties part number "support_fourche_partie_capot"
